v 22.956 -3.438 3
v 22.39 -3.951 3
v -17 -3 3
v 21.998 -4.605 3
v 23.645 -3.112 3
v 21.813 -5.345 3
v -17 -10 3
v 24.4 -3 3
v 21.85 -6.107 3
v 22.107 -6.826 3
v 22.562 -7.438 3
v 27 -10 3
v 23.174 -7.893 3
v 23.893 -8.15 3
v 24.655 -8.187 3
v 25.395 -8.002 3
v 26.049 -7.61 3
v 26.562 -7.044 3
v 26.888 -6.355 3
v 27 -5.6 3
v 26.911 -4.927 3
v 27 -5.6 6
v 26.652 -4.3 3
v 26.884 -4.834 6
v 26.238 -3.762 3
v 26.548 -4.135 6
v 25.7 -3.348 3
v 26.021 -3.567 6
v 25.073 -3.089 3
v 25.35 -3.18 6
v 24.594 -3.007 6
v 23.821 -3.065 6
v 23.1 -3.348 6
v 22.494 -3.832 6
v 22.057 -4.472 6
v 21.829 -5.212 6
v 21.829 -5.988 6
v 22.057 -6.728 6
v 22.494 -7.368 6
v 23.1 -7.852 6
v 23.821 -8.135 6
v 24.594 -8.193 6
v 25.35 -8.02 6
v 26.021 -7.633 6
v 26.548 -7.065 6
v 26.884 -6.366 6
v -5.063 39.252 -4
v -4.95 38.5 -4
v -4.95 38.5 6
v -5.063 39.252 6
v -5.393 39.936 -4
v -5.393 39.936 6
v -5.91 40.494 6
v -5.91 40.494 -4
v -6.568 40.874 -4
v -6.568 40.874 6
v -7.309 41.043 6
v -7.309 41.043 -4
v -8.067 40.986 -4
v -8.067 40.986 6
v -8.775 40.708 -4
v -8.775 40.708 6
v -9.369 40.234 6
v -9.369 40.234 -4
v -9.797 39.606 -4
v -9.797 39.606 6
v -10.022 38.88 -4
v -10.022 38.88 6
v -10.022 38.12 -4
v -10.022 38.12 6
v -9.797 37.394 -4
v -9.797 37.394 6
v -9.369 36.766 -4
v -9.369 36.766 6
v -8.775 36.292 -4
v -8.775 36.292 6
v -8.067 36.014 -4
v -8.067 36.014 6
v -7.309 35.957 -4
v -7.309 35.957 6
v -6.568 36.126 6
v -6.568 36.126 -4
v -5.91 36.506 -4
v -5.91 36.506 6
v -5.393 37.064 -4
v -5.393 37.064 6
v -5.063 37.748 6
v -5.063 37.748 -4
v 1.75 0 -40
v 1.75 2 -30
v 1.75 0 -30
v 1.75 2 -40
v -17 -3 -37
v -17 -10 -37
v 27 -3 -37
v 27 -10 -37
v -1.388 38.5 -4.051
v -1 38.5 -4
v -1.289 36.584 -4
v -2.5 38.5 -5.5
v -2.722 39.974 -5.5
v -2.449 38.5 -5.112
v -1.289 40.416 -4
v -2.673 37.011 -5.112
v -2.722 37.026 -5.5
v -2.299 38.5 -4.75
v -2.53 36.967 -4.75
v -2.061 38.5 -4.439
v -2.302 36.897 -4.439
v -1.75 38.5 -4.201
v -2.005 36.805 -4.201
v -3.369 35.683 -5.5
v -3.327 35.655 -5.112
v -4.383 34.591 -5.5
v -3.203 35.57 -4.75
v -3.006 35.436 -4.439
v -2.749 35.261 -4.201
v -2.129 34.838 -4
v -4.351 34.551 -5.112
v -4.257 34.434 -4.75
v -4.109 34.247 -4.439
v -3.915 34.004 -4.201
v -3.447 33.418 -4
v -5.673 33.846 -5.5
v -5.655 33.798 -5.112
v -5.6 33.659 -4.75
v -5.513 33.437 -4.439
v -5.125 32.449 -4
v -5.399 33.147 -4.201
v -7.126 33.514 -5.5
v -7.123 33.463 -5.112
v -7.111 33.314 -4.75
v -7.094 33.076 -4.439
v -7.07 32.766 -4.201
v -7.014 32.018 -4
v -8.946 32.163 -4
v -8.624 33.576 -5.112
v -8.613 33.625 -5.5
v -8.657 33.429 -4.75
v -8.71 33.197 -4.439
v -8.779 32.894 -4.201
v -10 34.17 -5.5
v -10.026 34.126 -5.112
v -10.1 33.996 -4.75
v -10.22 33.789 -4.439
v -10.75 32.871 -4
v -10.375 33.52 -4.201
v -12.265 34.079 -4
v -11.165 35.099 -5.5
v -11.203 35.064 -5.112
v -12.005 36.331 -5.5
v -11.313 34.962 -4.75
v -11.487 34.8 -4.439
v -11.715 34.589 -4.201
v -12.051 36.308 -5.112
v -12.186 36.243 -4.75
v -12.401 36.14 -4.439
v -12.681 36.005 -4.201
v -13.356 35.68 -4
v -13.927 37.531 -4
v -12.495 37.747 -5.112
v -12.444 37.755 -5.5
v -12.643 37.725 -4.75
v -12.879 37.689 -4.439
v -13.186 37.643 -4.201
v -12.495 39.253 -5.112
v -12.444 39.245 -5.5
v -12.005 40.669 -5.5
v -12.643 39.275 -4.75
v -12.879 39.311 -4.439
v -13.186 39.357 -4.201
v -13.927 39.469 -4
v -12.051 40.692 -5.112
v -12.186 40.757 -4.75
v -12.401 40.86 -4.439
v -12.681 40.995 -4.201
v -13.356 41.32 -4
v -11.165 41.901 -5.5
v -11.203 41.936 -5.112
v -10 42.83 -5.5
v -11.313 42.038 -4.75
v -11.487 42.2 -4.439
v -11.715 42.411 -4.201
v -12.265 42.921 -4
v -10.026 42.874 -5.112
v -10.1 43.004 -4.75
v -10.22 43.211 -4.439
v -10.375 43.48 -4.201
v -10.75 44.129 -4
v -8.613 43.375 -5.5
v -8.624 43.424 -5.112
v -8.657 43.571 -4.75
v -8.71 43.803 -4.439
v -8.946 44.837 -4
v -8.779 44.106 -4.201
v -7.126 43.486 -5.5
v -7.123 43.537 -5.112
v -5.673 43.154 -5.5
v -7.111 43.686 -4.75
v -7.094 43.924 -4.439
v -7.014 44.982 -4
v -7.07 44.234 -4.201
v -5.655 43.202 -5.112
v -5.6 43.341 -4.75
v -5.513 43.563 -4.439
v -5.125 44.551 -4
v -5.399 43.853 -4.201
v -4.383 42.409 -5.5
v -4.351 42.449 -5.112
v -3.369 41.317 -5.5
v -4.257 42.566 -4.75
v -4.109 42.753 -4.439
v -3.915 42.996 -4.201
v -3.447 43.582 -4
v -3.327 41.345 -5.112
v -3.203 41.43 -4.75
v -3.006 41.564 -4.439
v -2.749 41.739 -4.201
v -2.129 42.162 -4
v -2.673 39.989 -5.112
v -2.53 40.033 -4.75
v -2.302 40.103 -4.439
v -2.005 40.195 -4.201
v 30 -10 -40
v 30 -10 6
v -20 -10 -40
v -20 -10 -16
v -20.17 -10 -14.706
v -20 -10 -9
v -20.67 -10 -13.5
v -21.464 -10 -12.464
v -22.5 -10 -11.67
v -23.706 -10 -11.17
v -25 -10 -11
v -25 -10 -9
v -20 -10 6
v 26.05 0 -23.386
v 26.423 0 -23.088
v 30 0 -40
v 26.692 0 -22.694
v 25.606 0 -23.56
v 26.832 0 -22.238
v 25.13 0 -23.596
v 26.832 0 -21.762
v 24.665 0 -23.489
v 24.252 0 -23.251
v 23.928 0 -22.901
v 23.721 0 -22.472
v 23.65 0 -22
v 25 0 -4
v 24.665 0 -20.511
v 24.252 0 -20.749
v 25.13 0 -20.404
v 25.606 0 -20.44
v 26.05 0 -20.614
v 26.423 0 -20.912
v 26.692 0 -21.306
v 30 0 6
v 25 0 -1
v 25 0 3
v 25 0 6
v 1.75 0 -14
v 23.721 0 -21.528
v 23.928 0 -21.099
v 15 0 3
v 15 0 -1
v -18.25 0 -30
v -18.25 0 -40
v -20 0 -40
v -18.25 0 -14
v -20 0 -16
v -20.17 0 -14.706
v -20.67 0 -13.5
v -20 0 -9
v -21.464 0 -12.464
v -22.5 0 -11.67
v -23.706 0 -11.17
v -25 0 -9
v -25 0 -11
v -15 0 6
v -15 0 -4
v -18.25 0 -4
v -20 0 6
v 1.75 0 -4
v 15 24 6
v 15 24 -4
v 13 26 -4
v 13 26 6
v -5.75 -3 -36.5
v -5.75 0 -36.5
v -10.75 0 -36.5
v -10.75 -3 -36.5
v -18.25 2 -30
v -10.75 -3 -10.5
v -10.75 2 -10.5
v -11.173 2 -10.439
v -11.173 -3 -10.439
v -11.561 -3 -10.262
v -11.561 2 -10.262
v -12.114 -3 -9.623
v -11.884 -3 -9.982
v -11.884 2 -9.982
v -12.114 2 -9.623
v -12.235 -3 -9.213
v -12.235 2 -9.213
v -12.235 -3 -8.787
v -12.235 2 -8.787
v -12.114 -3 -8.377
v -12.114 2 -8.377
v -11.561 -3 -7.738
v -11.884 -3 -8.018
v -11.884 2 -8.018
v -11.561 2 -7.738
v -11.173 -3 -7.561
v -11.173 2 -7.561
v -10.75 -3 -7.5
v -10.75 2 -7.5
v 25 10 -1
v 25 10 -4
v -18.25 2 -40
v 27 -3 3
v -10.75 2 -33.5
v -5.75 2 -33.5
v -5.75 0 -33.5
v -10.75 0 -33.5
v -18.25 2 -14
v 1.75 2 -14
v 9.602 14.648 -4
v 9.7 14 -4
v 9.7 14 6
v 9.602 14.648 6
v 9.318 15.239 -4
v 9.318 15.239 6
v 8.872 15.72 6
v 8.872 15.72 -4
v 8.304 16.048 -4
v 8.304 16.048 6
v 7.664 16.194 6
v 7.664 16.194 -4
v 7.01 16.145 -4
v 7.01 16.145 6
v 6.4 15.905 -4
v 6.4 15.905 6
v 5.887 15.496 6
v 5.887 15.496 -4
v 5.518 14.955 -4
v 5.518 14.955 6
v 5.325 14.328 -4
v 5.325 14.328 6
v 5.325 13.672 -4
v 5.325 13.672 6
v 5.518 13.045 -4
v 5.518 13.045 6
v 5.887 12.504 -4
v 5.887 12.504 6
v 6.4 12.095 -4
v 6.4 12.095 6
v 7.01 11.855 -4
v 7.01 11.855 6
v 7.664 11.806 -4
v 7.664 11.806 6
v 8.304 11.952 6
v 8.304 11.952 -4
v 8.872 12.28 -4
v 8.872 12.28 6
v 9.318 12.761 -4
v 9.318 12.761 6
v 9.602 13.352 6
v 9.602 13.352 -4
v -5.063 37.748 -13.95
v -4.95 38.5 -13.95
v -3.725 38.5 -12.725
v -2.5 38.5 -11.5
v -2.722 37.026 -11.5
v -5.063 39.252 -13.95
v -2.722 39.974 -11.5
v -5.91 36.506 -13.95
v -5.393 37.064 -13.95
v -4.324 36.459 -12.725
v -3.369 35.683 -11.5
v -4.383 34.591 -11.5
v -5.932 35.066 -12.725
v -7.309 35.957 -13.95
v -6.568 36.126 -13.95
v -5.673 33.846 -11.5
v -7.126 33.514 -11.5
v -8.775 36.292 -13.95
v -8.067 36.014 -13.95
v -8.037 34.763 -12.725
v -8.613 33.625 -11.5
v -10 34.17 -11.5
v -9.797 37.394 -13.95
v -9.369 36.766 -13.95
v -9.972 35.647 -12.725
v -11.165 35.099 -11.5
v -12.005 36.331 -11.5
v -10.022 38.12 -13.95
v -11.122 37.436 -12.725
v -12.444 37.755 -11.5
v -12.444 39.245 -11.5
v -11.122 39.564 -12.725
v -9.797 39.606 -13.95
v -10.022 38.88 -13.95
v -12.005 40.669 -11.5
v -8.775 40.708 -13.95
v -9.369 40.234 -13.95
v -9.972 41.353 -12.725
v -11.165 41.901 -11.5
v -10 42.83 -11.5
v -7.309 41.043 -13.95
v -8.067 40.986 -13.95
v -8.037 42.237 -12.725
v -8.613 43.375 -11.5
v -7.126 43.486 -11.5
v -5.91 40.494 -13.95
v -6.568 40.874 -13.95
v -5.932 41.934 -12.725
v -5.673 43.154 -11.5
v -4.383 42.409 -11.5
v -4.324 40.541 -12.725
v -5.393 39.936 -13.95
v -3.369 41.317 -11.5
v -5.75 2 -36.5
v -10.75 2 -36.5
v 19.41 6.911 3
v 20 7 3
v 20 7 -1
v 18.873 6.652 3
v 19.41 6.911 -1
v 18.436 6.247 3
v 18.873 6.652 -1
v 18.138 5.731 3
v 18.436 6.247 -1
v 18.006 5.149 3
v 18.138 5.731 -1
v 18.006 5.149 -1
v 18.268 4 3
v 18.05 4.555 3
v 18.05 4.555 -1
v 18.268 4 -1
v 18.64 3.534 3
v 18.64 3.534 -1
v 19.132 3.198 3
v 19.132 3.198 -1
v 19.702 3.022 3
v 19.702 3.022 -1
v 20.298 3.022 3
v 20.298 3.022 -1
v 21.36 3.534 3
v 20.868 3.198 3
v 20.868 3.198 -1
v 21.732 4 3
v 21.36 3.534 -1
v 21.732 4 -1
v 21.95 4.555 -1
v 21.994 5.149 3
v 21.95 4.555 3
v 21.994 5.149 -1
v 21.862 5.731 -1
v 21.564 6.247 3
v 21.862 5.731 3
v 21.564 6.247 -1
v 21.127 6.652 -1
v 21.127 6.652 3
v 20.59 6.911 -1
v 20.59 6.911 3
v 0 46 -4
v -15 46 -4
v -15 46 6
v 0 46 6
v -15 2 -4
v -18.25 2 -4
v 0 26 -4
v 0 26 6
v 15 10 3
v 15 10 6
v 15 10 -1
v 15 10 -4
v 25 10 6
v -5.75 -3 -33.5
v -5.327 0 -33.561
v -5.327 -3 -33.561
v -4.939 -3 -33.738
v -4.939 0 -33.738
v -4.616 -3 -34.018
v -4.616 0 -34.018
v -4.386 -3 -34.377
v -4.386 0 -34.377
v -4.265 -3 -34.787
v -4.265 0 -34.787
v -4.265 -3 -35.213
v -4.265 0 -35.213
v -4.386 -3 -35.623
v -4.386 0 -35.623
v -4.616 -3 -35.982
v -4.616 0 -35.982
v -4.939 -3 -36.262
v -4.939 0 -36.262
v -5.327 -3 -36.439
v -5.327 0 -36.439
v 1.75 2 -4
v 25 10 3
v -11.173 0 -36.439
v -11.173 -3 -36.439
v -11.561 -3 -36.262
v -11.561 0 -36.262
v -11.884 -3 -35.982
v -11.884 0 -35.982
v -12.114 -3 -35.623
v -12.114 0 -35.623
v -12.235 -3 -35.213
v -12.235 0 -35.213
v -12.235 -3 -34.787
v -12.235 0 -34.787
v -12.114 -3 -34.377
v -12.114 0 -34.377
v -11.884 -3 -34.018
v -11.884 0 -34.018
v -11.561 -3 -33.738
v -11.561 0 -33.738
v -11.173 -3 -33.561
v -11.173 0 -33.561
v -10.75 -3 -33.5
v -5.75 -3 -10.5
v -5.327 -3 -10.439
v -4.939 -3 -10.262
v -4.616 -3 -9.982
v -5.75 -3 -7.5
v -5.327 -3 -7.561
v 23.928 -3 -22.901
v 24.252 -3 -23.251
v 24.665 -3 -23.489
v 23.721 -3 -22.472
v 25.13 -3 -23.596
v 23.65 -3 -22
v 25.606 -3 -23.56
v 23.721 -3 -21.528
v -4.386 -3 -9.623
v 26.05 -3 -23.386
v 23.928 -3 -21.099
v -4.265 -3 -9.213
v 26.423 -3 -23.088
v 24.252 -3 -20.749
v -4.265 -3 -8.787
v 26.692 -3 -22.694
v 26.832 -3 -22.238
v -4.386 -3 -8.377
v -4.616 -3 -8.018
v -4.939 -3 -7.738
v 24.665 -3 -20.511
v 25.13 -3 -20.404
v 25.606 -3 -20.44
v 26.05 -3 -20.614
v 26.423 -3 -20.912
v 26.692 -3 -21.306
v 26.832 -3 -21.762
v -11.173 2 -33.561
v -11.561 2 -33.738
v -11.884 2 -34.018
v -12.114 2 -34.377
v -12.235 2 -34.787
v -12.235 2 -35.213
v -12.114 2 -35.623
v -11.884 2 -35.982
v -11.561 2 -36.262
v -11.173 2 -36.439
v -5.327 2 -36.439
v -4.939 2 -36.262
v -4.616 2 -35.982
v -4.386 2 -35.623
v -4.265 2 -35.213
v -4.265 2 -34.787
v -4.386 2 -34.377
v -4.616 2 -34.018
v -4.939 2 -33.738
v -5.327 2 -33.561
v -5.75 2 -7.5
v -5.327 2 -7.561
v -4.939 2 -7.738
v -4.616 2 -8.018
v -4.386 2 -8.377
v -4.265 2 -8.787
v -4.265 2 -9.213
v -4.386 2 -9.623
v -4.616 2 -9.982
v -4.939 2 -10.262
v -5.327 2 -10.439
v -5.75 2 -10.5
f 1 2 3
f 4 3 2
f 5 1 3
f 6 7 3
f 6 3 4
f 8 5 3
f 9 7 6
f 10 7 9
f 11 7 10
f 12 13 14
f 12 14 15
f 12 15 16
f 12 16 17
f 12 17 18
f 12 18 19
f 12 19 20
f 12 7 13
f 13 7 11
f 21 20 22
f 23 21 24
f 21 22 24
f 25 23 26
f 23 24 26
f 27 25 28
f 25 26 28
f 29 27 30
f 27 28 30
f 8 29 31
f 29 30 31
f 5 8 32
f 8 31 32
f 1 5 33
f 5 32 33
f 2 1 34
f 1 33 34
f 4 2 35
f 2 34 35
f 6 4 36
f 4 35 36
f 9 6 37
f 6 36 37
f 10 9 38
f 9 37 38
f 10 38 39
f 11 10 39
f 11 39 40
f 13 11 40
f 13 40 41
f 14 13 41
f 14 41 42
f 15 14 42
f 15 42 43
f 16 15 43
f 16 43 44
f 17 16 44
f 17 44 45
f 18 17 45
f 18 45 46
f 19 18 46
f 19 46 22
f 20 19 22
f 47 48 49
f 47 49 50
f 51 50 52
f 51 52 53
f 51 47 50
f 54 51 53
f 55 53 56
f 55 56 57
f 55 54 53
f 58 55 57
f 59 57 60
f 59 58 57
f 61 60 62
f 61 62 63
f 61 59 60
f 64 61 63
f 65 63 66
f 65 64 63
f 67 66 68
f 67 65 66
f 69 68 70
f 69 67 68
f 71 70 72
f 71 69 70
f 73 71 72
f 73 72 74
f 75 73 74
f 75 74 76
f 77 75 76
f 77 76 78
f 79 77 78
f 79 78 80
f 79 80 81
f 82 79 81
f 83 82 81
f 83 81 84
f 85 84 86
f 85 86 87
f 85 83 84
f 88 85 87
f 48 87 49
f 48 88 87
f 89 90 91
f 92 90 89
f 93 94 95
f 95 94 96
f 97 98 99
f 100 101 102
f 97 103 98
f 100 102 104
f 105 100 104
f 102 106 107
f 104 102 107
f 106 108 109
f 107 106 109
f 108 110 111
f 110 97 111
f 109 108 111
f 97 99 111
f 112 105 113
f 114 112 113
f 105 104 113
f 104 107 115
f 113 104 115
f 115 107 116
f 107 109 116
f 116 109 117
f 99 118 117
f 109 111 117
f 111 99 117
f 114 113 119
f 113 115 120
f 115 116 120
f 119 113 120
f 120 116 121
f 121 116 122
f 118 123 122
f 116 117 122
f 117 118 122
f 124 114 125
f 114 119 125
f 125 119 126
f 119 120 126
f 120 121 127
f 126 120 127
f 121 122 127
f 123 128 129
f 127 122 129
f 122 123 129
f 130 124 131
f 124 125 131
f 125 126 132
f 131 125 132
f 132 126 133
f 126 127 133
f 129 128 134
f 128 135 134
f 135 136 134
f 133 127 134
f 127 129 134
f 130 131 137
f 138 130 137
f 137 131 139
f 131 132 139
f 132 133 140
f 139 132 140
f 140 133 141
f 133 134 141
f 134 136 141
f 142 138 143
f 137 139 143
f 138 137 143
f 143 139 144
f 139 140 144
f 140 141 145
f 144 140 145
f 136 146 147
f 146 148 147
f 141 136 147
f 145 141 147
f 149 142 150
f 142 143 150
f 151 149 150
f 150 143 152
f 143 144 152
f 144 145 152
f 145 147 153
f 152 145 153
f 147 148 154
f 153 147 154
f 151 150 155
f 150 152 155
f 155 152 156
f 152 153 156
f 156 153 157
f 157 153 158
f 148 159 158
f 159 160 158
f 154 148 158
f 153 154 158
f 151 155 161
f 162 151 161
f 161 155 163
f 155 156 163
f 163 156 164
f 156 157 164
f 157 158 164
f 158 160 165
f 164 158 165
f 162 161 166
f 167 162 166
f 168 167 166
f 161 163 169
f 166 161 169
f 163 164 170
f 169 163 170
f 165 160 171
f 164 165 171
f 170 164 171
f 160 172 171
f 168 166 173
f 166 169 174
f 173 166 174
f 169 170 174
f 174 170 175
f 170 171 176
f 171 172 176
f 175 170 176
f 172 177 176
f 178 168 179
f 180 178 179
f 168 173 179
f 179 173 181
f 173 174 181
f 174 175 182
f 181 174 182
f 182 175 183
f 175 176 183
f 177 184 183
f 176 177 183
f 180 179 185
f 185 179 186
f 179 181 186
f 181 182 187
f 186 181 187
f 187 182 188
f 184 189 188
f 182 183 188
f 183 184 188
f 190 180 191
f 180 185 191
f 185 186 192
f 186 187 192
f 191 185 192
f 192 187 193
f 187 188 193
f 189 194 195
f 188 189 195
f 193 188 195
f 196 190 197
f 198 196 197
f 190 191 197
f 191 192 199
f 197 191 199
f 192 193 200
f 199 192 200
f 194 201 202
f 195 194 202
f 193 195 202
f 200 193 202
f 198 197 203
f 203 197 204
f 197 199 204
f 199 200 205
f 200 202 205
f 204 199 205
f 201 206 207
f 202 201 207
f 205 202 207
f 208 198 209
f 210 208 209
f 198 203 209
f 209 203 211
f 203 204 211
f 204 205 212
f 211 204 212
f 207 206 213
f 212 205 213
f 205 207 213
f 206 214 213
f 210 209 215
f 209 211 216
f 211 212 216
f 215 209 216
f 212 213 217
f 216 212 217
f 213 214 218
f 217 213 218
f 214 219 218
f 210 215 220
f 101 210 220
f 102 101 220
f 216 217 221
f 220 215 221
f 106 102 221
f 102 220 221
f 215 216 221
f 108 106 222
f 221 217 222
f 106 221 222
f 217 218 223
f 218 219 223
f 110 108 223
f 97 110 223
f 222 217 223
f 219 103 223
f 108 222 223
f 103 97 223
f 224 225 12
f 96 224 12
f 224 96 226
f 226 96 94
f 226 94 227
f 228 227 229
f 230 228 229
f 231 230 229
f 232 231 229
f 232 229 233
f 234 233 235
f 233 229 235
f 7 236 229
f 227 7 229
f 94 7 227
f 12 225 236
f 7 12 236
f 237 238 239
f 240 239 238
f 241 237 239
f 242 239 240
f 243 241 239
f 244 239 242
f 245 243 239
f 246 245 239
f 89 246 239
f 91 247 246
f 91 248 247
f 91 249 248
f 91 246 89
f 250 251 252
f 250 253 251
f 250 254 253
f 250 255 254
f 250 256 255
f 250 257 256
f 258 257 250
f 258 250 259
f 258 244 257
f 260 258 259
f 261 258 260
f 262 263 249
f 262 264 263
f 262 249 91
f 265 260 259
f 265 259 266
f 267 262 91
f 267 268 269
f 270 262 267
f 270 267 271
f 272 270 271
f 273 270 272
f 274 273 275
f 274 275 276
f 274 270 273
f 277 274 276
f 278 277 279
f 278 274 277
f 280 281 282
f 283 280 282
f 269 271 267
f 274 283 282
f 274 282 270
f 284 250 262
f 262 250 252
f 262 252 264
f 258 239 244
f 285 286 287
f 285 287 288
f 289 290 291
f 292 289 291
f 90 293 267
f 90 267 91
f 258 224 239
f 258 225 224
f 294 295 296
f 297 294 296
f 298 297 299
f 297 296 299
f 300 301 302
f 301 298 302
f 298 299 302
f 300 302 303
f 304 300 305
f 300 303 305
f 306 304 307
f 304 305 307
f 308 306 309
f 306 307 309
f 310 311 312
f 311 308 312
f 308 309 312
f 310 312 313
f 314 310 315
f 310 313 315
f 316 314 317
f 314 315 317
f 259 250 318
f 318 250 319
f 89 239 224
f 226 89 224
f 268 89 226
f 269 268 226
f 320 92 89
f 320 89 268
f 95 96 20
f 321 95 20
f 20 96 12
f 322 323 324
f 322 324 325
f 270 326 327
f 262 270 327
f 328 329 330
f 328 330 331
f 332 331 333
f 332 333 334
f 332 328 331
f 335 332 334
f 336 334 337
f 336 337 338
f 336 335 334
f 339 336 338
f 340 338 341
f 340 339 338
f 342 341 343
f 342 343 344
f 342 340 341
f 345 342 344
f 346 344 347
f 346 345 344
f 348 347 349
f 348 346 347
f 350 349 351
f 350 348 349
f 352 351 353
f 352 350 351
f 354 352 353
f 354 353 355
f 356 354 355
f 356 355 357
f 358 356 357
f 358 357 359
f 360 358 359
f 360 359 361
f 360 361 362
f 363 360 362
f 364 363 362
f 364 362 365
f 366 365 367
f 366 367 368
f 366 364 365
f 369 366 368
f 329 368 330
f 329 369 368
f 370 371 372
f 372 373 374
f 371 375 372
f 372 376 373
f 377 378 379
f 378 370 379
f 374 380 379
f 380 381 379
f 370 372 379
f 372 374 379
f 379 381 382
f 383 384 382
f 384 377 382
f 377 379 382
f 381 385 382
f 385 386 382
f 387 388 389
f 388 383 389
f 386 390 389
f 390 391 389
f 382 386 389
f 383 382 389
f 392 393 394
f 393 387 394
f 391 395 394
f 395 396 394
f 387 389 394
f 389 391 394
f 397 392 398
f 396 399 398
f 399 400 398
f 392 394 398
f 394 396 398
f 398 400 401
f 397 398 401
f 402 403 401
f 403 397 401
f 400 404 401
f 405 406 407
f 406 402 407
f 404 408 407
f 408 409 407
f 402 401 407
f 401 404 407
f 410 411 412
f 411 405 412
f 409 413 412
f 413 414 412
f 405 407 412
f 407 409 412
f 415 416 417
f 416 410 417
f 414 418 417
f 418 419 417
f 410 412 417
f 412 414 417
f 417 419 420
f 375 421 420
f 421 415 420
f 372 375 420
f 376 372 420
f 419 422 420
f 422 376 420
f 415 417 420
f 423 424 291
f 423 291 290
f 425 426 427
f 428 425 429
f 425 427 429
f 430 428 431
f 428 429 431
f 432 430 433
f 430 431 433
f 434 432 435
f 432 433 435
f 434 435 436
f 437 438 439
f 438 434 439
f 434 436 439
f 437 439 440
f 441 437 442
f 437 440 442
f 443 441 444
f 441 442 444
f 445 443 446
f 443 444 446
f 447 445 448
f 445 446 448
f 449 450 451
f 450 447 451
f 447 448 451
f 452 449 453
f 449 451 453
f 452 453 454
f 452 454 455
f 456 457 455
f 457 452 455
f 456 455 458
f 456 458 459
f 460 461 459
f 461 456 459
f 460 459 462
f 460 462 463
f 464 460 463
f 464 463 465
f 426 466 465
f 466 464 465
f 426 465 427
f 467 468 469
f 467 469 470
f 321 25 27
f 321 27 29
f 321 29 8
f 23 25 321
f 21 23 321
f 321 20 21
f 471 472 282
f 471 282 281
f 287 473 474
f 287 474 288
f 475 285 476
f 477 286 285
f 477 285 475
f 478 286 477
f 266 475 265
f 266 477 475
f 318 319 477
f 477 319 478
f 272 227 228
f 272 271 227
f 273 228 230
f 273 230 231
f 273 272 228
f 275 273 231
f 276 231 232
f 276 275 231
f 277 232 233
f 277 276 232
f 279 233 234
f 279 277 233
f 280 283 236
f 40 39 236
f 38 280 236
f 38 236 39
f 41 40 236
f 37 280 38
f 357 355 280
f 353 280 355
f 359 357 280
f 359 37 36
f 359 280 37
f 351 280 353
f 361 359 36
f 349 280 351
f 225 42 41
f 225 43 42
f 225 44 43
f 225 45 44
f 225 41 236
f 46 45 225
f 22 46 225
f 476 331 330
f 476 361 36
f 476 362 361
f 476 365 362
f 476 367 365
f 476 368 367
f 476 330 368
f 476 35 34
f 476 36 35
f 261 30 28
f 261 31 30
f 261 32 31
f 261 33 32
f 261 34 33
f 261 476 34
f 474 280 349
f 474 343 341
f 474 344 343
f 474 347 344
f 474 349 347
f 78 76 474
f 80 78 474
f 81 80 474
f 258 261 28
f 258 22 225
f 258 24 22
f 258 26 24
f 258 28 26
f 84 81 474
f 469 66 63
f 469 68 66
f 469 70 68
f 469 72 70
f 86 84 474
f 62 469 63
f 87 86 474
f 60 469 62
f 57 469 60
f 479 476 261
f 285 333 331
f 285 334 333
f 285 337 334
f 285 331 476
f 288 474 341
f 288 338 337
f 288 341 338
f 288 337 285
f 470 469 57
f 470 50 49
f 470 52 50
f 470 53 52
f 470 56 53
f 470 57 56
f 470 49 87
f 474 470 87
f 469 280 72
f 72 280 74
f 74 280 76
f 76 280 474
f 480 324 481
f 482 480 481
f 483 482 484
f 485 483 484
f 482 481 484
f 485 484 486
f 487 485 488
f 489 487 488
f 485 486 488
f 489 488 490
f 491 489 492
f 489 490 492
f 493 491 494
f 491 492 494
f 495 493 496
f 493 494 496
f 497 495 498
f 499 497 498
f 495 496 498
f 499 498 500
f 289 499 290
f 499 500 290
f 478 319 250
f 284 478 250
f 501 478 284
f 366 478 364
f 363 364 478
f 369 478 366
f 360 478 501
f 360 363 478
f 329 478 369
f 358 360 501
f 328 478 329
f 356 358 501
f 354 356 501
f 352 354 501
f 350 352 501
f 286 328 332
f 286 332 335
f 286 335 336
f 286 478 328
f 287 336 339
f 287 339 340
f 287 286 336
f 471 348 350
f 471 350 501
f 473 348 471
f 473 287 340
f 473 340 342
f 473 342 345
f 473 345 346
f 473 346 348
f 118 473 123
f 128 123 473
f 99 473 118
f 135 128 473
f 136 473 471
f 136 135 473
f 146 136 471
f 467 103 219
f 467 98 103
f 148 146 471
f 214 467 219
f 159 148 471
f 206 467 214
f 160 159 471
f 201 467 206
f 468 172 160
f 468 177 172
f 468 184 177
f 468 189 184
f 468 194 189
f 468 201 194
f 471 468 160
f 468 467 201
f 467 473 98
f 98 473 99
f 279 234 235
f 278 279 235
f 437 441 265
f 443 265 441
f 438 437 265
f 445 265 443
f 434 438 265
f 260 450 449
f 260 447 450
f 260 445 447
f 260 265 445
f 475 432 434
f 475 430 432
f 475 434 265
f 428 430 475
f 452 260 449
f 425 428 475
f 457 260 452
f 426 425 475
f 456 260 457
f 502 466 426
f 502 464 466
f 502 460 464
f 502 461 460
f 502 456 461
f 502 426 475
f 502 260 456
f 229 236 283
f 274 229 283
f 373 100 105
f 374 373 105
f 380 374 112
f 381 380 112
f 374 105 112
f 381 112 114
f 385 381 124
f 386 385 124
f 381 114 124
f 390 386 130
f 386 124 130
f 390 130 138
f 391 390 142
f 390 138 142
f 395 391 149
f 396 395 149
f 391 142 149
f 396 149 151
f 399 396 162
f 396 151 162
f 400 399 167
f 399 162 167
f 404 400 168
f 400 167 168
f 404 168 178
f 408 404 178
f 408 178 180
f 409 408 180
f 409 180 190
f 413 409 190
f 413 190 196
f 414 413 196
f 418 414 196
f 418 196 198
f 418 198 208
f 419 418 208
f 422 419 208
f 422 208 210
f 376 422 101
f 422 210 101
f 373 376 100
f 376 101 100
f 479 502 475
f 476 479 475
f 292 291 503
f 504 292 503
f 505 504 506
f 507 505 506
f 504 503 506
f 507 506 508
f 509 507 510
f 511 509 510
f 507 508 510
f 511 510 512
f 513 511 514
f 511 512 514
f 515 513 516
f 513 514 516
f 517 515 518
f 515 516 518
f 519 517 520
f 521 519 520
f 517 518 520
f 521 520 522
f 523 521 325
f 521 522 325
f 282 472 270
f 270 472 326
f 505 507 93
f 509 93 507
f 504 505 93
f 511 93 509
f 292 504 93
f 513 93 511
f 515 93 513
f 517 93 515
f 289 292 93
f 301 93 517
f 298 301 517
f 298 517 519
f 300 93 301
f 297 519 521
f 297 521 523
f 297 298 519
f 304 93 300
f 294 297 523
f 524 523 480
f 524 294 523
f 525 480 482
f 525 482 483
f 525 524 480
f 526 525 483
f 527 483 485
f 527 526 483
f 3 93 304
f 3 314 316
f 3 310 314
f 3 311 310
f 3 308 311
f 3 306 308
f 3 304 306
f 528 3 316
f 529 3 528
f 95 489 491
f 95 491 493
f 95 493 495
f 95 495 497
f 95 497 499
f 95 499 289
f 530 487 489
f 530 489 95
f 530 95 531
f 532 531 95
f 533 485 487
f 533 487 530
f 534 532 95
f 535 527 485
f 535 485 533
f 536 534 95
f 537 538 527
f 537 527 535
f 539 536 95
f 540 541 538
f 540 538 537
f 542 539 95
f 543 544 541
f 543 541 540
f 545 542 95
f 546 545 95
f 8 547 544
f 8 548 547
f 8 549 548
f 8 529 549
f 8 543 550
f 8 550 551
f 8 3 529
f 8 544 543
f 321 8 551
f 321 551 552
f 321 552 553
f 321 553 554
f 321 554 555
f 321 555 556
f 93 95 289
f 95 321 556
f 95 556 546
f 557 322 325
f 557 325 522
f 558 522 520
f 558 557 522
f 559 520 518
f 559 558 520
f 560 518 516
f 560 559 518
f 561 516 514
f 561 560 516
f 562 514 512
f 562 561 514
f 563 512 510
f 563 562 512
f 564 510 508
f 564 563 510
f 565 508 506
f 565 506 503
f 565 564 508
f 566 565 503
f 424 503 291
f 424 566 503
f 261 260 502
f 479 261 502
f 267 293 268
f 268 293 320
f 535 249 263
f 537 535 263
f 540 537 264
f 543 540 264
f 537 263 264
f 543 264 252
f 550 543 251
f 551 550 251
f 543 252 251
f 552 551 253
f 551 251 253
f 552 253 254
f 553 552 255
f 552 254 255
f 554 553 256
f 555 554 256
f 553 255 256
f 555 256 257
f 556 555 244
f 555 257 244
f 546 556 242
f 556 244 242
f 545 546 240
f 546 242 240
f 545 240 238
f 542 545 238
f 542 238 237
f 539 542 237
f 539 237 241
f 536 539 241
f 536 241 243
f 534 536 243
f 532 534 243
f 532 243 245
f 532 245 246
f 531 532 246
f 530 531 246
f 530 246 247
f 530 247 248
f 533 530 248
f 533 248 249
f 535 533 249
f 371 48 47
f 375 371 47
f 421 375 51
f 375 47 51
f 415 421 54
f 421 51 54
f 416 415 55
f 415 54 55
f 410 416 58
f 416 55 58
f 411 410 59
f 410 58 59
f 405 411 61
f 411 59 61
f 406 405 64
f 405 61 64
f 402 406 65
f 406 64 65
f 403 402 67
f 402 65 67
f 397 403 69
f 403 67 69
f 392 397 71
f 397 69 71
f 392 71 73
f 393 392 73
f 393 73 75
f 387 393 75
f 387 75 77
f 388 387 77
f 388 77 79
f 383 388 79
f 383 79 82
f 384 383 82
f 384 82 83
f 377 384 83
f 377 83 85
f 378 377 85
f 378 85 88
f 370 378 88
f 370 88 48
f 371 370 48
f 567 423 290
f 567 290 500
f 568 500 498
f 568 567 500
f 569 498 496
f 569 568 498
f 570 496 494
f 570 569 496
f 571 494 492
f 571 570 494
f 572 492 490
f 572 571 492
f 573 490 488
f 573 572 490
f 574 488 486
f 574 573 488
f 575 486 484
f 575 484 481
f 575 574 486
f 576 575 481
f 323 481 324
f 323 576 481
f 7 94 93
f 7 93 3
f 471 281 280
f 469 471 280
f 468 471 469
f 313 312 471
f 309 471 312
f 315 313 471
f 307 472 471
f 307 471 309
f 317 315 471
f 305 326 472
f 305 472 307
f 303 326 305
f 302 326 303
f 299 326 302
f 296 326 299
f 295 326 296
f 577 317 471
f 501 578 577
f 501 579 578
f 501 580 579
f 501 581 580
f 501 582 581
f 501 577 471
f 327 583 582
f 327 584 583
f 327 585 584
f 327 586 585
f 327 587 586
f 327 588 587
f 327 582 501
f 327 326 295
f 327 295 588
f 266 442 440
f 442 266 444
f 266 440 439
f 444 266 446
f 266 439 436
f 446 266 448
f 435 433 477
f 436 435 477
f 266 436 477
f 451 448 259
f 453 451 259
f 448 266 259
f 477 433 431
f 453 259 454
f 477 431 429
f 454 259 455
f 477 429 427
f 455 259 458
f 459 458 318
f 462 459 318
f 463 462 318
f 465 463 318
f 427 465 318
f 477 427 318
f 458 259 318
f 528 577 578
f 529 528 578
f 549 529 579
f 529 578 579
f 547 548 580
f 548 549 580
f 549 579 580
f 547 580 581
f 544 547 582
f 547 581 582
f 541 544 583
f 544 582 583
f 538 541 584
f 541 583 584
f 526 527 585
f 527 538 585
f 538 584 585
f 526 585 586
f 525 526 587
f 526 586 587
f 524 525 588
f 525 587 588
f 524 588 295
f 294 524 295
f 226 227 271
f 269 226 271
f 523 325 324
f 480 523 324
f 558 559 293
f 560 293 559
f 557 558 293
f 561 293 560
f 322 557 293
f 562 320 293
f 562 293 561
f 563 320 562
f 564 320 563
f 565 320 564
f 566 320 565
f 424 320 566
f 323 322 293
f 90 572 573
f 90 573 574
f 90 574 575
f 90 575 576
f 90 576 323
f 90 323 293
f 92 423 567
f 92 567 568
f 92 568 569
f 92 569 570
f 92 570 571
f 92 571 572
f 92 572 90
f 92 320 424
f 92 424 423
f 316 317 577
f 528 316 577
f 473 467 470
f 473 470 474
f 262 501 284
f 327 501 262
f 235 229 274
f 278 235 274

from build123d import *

# Parameters (mm, degrees)
BOSS_EXTRUDE1_DEPTH      = 6
BOSS_EXTRUDE1_DEPTH_BACK = 4
SKETCH1_R                = 2.55
SKETCH1_R_2              = 2.2
SKETCH4_W                = 10
SKETCH4_H                = 10
BOSS_EXTRUDE4_DEPTH      = 10
SKETCH5_W                = 4
SKETCH5_H                = 10
CUT_EXTRUDE1_DEPTH       = 10
BOSS_EXTRUDE5_REACH      = 54.82
SKETCH6_R                = 2
CHAMFER1_SIZE            = 2
SKETCH7_W                = 50
SKETCH7_H                = 20.5
BOSS_EXTRUDE6_DEPTH      = 10
SKETCH13_W               = 50
SKETCH13_H               = 10
BOSS_EXTRUDE9_DEPTH      = 25.5
SKETCH16_W               = 44
SKETCH16_H               = 40
CUT_EXTRUDE3_DEPTH       = 7
SKETCH17_R               = 2.6
CUT_EXTRUDE4_DEPTH       = 3
SKETCH18_W               = 2
SKETCH18_H               = 10
BOSS_EXTRUDE11_DEPTH     = 5
FILLET2_R                = 5
CUT_EXTRUDE5_REACH       = 67.666
SKETCH20_R               = 2.55
FILLET5_R                = 1.5
CUT_EXTRUDE6_DEPTH       = 3
BOSS_EXTRUDE12_START     = 2
SKETCH22_W               = 20
SKETCH22_H               = 10
BOSS_EXTRUDE12_DEPTH     = 2
CUT_EXTRUDE7_REACH       = 69.941
SKETCH23_R               = 1.6
CUT_EXTRUDE8_DEPTH       = 68.941151006


with BuildPart() as part:
    # Sketch1 → Boss-Extrude1 (new, two sides: drawn at the far end of the back side and taken through both)
    with BuildSketch(Plane.XY.offset(-BOSS_EXTRUDE1_DEPTH_BACK)):
        Polygon((-15, 0), (-15, 46), (0, 46), (0, 26), (15, 26), (15, 0), align=None)
        with Locations((-7.5, 38.5)):
            Circle(SKETCH1_R, mode=Mode.SUBTRACT)
        with Locations((7.5, 14)):
            Circle(SKETCH1_R_2, mode=Mode.SUBTRACT)
    extrude(amount=BOSS_EXTRUDE1_DEPTH + BOSS_EXTRUDE1_DEPTH_BACK)

    # Sketch4 → Boss-Extrude4 (add)
    with BuildSketch(Plane(origin=(0, 0, -4), x_dir=(-1, 0, 0), z_dir=(0, 0, -1))):
        with Locations((-20, 5)):
            Rectangle(SKETCH4_W, SKETCH4_H)
    extrude(amount=-BOSS_EXTRUDE4_DEPTH)

    # Sketch5 → Cut-Extrude1 (cut)
    with BuildSketch(Plane(origin=(25, 0, 0), x_dir=(0, 0, -1), z_dir=(1, 0, 0))):
        with Locations((-1, 5)):
            Rectangle(SKETCH5_W, SKETCH5_H)
    extrude(amount=-CUT_EXTRUDE1_DEPTH, mode=Mode.SUBTRACT)

    # Sketch6 → Boss-Extrude5 (add, up to next)
    with BuildSketch(Plane.XY.offset(-1), mode=Mode.PRIVATE) as boss_extrude5_sk1:
        with Locations(Location((20, 5, 0), (0, 0, 90))):
            Circle(SKETCH6_R)
    boss_extrude5_tool1 = extrude(boss_extrude5_sk1.sketch, amount=BOSS_EXTRUDE5_REACH, mode=Mode.PRIVATE) - part.part
    add(boss_extrude5_tool1.solids().sort_by_distance((20, 5, -1))[0])

    # Chamfer1
    chamfer1_edges = [part.edges().sort_by_distance(p)[0] for p in [
        (15, 26, 1),
    ]]
    chamfer(chamfer1_edges, length=CHAMFER1_SIZE)

    # Sketch7 → Boss-Extrude6 (add)
    with BuildSketch(Plane.XZ):
        with Locations((5, -4.25)):
            Rectangle(SKETCH7_W, SKETCH7_H)
    extrude(amount=BOSS_EXTRUDE6_DEPTH)

    # Sketch13 → Boss-Extrude9 (add)
    with BuildSketch(Plane(origin=(0, 0, -14.5), x_dir=(-1, 0, 0), z_dir=(0, 0, -1))):
        with Locations((-5, -5)):
            Rectangle(SKETCH13_W, SKETCH13_H)
    extrude(amount=BOSS_EXTRUDE9_DEPTH)

    # Sketch16 → Cut-Extrude3 (cut)
    with BuildSketch(Plane.XZ.offset(10)):
        with Locations((5, -17)):
            Rectangle(SKETCH16_W, SKETCH16_H)
    extrude(amount=-CUT_EXTRUDE3_DEPTH, mode=Mode.SUBTRACT)

    # Sketch17 → Cut-Extrude4 (cut)
    with BuildSketch(Plane.XY.offset(6)):
        with Locations((24.4, -5.6)):
            Circle(SKETCH17_R)
    extrude(amount=-CUT_EXTRUDE4_DEPTH, mode=Mode.SUBTRACT)

    # Sketch18 → Boss-Extrude11 (add)
    with BuildSketch(Plane.ZY.offset(20)):
        with Locations((-10, -5)):
            Rectangle(SKETCH18_W, SKETCH18_H)
    extrude(amount=BOSS_EXTRUDE11_DEPTH)

    # Fillet2
    fillet2_edges = [part.edges().sort_by_distance(p)[0] for p in [
        (-20, -5, -11),
    ]]
    fillet(fillet2_edges, radius=FILLET2_R - 0.0001)  # a hair under: the kernel refuses the full size

    # Sketch19 → Revolve1 (revolve)
    with BuildSketch(Plane.ZY.offset(7.5), mode=Mode.PRIVATE) as revolve1_sk:
        Polygon((-4, 38.5), (-14, 38.5), (-14, 41), (-11.5, 43.5), (-4, 43.5), align=None)
    revolve(revolve1_sk.sketch.rotate(Axis((-7.5, 38.5, -4), (0, 0, -1)), 90), axis=Axis((-7.5, 38.5, -4), (0, 0, -1)))

    # Sketch20 → Cut-Extrude5 (cut, up to next)
    with BuildSketch(Plane.XY.offset(-4), mode=Mode.PRIVATE) as cut_extrude5_sk1:
        with Locations((-7.5, 38.5)):
            Circle(SKETCH20_R)
    cut_extrude5_tool1 = extrude(cut_extrude5_sk1.sketch, amount=-CUT_EXTRUDE5_REACH, mode=Mode.PRIVATE) & part.part
    add(cut_extrude5_tool1.solids().sort_by_distance((-7.5, 38.5, -4))[0], mode=Mode.SUBTRACT)

    # Fillet5
    fillet5_edges = [part.edges().sort_by_distance(p)[0] for p in [
        (-12.5, 38.5, -4),
    ]]
    fillet(fillet5_edges, radius=FILLET5_R)

    # Sketch12 → Cut-Extrude6 (cut)
    with BuildSketch(Plane(origin=(0, 0, 0), x_dir=(1, 0, 0), z_dir=(0, 1, 0))):
        with BuildLine():
            Line((-10.75, 10.5), (-5.75, 10.5))
            ThreePointArc((-5.75, 10.5), (-4.25, 9), (-5.75, 7.5))
            Line((-5.75, 7.5), (-10.75, 7.5))
            ThreePointArc((-10.75, 7.5), (-12.25, 9), (-10.75, 10.5))
        make_face()
    extrude(amount=-CUT_EXTRUDE6_DEPTH, mode=Mode.SUBTRACT)

    # Sketch22 → Boss-Extrude12 (add)
    # profile 1 of 2: a face of its own
    with BuildSketch(Plane(origin=(0, 0, 0), x_dir=(1, 0, 0), z_dir=(0, 1, 0)).offset(BOSS_EXTRUDE12_START)):
        with Locations((-8.25, 9)):
            Rectangle(SKETCH22_W, SKETCH22_H)
        with BuildLine():
            Line((-10.75, 7.5), (-5.75, 7.5))
            ThreePointArc((-5.75, 7.5), (-4.25, 9), (-5.75, 10.5))
            Line((-5.75, 10.5), (-10.75, 10.5))
            ThreePointArc((-10.75, 10.5), (-12.25, 9), (-10.75, 7.5))
        make_face(mode=Mode.SUBTRACT)
    # profile 2 of 2: a face of its own
    with BuildSketch(Plane(origin=(0, 0, 0), x_dir=(1, 0, 0), z_dir=(0, 1, 0)).offset(BOSS_EXTRUDE12_START)):
        with Locations((-8.25, 35)):
            Rectangle(SKETCH22_W, SKETCH22_H)
        with BuildLine():
            Line((-10.75, 36.5), (-5.75, 36.5))
            ThreePointArc((-5.75, 36.5), (-4.25, 35), (-5.75, 33.5))
            Line((-5.75, 33.5), (-10.75, 33.5))
            ThreePointArc((-10.75, 33.5), (-12.25, 35), (-10.75, 36.5))
        make_face(mode=Mode.SUBTRACT)
    extrude(amount=-BOSS_EXTRUDE12_DEPTH)

    # Sketch23 → Cut-Extrude7 (cut, up to next)
    with BuildSketch(Plane(origin=(0, 0, 0), x_dir=(1, 0, 0), z_dir=(0, 1, 0)), mode=Mode.PRIVATE) as cut_extrude7_sk1:
        with Locations(Location((25.25, 22, 0), (0, 0, 180))):
            Circle(SKETCH23_R)
    cut_extrude7_tool1 = extrude(cut_extrude7_sk1.sketch, amount=-CUT_EXTRUDE7_REACH, mode=Mode.PRIVATE) & part.part
    add(cut_extrude7_tool1.solids().sort_by_distance((25.25, 0, -22))[0], mode=Mode.SUBTRACT)

    # Sketch24 → Cut-Extrude8 (cut, through all)
    with BuildSketch(Plane(origin=(0, 0, 0), x_dir=(1, 0, 0), z_dir=(0, 1, 0))):
        with BuildLine():
            Line((-10.75, 33.5), (-5.75, 33.5))
            ThreePointArc((-5.75, 33.5), (-4.25, 35), (-5.75, 36.5))
            Line((-5.75, 36.5), (-10.75, 36.5))
            ThreePointArc((-10.75, 36.5), (-12.25, 35), (-10.75, 33.5))
        make_face()
    extrude(amount=-CUT_EXTRUDE8_DEPTH, mode=Mode.SUBTRACT)


solid = part.part
